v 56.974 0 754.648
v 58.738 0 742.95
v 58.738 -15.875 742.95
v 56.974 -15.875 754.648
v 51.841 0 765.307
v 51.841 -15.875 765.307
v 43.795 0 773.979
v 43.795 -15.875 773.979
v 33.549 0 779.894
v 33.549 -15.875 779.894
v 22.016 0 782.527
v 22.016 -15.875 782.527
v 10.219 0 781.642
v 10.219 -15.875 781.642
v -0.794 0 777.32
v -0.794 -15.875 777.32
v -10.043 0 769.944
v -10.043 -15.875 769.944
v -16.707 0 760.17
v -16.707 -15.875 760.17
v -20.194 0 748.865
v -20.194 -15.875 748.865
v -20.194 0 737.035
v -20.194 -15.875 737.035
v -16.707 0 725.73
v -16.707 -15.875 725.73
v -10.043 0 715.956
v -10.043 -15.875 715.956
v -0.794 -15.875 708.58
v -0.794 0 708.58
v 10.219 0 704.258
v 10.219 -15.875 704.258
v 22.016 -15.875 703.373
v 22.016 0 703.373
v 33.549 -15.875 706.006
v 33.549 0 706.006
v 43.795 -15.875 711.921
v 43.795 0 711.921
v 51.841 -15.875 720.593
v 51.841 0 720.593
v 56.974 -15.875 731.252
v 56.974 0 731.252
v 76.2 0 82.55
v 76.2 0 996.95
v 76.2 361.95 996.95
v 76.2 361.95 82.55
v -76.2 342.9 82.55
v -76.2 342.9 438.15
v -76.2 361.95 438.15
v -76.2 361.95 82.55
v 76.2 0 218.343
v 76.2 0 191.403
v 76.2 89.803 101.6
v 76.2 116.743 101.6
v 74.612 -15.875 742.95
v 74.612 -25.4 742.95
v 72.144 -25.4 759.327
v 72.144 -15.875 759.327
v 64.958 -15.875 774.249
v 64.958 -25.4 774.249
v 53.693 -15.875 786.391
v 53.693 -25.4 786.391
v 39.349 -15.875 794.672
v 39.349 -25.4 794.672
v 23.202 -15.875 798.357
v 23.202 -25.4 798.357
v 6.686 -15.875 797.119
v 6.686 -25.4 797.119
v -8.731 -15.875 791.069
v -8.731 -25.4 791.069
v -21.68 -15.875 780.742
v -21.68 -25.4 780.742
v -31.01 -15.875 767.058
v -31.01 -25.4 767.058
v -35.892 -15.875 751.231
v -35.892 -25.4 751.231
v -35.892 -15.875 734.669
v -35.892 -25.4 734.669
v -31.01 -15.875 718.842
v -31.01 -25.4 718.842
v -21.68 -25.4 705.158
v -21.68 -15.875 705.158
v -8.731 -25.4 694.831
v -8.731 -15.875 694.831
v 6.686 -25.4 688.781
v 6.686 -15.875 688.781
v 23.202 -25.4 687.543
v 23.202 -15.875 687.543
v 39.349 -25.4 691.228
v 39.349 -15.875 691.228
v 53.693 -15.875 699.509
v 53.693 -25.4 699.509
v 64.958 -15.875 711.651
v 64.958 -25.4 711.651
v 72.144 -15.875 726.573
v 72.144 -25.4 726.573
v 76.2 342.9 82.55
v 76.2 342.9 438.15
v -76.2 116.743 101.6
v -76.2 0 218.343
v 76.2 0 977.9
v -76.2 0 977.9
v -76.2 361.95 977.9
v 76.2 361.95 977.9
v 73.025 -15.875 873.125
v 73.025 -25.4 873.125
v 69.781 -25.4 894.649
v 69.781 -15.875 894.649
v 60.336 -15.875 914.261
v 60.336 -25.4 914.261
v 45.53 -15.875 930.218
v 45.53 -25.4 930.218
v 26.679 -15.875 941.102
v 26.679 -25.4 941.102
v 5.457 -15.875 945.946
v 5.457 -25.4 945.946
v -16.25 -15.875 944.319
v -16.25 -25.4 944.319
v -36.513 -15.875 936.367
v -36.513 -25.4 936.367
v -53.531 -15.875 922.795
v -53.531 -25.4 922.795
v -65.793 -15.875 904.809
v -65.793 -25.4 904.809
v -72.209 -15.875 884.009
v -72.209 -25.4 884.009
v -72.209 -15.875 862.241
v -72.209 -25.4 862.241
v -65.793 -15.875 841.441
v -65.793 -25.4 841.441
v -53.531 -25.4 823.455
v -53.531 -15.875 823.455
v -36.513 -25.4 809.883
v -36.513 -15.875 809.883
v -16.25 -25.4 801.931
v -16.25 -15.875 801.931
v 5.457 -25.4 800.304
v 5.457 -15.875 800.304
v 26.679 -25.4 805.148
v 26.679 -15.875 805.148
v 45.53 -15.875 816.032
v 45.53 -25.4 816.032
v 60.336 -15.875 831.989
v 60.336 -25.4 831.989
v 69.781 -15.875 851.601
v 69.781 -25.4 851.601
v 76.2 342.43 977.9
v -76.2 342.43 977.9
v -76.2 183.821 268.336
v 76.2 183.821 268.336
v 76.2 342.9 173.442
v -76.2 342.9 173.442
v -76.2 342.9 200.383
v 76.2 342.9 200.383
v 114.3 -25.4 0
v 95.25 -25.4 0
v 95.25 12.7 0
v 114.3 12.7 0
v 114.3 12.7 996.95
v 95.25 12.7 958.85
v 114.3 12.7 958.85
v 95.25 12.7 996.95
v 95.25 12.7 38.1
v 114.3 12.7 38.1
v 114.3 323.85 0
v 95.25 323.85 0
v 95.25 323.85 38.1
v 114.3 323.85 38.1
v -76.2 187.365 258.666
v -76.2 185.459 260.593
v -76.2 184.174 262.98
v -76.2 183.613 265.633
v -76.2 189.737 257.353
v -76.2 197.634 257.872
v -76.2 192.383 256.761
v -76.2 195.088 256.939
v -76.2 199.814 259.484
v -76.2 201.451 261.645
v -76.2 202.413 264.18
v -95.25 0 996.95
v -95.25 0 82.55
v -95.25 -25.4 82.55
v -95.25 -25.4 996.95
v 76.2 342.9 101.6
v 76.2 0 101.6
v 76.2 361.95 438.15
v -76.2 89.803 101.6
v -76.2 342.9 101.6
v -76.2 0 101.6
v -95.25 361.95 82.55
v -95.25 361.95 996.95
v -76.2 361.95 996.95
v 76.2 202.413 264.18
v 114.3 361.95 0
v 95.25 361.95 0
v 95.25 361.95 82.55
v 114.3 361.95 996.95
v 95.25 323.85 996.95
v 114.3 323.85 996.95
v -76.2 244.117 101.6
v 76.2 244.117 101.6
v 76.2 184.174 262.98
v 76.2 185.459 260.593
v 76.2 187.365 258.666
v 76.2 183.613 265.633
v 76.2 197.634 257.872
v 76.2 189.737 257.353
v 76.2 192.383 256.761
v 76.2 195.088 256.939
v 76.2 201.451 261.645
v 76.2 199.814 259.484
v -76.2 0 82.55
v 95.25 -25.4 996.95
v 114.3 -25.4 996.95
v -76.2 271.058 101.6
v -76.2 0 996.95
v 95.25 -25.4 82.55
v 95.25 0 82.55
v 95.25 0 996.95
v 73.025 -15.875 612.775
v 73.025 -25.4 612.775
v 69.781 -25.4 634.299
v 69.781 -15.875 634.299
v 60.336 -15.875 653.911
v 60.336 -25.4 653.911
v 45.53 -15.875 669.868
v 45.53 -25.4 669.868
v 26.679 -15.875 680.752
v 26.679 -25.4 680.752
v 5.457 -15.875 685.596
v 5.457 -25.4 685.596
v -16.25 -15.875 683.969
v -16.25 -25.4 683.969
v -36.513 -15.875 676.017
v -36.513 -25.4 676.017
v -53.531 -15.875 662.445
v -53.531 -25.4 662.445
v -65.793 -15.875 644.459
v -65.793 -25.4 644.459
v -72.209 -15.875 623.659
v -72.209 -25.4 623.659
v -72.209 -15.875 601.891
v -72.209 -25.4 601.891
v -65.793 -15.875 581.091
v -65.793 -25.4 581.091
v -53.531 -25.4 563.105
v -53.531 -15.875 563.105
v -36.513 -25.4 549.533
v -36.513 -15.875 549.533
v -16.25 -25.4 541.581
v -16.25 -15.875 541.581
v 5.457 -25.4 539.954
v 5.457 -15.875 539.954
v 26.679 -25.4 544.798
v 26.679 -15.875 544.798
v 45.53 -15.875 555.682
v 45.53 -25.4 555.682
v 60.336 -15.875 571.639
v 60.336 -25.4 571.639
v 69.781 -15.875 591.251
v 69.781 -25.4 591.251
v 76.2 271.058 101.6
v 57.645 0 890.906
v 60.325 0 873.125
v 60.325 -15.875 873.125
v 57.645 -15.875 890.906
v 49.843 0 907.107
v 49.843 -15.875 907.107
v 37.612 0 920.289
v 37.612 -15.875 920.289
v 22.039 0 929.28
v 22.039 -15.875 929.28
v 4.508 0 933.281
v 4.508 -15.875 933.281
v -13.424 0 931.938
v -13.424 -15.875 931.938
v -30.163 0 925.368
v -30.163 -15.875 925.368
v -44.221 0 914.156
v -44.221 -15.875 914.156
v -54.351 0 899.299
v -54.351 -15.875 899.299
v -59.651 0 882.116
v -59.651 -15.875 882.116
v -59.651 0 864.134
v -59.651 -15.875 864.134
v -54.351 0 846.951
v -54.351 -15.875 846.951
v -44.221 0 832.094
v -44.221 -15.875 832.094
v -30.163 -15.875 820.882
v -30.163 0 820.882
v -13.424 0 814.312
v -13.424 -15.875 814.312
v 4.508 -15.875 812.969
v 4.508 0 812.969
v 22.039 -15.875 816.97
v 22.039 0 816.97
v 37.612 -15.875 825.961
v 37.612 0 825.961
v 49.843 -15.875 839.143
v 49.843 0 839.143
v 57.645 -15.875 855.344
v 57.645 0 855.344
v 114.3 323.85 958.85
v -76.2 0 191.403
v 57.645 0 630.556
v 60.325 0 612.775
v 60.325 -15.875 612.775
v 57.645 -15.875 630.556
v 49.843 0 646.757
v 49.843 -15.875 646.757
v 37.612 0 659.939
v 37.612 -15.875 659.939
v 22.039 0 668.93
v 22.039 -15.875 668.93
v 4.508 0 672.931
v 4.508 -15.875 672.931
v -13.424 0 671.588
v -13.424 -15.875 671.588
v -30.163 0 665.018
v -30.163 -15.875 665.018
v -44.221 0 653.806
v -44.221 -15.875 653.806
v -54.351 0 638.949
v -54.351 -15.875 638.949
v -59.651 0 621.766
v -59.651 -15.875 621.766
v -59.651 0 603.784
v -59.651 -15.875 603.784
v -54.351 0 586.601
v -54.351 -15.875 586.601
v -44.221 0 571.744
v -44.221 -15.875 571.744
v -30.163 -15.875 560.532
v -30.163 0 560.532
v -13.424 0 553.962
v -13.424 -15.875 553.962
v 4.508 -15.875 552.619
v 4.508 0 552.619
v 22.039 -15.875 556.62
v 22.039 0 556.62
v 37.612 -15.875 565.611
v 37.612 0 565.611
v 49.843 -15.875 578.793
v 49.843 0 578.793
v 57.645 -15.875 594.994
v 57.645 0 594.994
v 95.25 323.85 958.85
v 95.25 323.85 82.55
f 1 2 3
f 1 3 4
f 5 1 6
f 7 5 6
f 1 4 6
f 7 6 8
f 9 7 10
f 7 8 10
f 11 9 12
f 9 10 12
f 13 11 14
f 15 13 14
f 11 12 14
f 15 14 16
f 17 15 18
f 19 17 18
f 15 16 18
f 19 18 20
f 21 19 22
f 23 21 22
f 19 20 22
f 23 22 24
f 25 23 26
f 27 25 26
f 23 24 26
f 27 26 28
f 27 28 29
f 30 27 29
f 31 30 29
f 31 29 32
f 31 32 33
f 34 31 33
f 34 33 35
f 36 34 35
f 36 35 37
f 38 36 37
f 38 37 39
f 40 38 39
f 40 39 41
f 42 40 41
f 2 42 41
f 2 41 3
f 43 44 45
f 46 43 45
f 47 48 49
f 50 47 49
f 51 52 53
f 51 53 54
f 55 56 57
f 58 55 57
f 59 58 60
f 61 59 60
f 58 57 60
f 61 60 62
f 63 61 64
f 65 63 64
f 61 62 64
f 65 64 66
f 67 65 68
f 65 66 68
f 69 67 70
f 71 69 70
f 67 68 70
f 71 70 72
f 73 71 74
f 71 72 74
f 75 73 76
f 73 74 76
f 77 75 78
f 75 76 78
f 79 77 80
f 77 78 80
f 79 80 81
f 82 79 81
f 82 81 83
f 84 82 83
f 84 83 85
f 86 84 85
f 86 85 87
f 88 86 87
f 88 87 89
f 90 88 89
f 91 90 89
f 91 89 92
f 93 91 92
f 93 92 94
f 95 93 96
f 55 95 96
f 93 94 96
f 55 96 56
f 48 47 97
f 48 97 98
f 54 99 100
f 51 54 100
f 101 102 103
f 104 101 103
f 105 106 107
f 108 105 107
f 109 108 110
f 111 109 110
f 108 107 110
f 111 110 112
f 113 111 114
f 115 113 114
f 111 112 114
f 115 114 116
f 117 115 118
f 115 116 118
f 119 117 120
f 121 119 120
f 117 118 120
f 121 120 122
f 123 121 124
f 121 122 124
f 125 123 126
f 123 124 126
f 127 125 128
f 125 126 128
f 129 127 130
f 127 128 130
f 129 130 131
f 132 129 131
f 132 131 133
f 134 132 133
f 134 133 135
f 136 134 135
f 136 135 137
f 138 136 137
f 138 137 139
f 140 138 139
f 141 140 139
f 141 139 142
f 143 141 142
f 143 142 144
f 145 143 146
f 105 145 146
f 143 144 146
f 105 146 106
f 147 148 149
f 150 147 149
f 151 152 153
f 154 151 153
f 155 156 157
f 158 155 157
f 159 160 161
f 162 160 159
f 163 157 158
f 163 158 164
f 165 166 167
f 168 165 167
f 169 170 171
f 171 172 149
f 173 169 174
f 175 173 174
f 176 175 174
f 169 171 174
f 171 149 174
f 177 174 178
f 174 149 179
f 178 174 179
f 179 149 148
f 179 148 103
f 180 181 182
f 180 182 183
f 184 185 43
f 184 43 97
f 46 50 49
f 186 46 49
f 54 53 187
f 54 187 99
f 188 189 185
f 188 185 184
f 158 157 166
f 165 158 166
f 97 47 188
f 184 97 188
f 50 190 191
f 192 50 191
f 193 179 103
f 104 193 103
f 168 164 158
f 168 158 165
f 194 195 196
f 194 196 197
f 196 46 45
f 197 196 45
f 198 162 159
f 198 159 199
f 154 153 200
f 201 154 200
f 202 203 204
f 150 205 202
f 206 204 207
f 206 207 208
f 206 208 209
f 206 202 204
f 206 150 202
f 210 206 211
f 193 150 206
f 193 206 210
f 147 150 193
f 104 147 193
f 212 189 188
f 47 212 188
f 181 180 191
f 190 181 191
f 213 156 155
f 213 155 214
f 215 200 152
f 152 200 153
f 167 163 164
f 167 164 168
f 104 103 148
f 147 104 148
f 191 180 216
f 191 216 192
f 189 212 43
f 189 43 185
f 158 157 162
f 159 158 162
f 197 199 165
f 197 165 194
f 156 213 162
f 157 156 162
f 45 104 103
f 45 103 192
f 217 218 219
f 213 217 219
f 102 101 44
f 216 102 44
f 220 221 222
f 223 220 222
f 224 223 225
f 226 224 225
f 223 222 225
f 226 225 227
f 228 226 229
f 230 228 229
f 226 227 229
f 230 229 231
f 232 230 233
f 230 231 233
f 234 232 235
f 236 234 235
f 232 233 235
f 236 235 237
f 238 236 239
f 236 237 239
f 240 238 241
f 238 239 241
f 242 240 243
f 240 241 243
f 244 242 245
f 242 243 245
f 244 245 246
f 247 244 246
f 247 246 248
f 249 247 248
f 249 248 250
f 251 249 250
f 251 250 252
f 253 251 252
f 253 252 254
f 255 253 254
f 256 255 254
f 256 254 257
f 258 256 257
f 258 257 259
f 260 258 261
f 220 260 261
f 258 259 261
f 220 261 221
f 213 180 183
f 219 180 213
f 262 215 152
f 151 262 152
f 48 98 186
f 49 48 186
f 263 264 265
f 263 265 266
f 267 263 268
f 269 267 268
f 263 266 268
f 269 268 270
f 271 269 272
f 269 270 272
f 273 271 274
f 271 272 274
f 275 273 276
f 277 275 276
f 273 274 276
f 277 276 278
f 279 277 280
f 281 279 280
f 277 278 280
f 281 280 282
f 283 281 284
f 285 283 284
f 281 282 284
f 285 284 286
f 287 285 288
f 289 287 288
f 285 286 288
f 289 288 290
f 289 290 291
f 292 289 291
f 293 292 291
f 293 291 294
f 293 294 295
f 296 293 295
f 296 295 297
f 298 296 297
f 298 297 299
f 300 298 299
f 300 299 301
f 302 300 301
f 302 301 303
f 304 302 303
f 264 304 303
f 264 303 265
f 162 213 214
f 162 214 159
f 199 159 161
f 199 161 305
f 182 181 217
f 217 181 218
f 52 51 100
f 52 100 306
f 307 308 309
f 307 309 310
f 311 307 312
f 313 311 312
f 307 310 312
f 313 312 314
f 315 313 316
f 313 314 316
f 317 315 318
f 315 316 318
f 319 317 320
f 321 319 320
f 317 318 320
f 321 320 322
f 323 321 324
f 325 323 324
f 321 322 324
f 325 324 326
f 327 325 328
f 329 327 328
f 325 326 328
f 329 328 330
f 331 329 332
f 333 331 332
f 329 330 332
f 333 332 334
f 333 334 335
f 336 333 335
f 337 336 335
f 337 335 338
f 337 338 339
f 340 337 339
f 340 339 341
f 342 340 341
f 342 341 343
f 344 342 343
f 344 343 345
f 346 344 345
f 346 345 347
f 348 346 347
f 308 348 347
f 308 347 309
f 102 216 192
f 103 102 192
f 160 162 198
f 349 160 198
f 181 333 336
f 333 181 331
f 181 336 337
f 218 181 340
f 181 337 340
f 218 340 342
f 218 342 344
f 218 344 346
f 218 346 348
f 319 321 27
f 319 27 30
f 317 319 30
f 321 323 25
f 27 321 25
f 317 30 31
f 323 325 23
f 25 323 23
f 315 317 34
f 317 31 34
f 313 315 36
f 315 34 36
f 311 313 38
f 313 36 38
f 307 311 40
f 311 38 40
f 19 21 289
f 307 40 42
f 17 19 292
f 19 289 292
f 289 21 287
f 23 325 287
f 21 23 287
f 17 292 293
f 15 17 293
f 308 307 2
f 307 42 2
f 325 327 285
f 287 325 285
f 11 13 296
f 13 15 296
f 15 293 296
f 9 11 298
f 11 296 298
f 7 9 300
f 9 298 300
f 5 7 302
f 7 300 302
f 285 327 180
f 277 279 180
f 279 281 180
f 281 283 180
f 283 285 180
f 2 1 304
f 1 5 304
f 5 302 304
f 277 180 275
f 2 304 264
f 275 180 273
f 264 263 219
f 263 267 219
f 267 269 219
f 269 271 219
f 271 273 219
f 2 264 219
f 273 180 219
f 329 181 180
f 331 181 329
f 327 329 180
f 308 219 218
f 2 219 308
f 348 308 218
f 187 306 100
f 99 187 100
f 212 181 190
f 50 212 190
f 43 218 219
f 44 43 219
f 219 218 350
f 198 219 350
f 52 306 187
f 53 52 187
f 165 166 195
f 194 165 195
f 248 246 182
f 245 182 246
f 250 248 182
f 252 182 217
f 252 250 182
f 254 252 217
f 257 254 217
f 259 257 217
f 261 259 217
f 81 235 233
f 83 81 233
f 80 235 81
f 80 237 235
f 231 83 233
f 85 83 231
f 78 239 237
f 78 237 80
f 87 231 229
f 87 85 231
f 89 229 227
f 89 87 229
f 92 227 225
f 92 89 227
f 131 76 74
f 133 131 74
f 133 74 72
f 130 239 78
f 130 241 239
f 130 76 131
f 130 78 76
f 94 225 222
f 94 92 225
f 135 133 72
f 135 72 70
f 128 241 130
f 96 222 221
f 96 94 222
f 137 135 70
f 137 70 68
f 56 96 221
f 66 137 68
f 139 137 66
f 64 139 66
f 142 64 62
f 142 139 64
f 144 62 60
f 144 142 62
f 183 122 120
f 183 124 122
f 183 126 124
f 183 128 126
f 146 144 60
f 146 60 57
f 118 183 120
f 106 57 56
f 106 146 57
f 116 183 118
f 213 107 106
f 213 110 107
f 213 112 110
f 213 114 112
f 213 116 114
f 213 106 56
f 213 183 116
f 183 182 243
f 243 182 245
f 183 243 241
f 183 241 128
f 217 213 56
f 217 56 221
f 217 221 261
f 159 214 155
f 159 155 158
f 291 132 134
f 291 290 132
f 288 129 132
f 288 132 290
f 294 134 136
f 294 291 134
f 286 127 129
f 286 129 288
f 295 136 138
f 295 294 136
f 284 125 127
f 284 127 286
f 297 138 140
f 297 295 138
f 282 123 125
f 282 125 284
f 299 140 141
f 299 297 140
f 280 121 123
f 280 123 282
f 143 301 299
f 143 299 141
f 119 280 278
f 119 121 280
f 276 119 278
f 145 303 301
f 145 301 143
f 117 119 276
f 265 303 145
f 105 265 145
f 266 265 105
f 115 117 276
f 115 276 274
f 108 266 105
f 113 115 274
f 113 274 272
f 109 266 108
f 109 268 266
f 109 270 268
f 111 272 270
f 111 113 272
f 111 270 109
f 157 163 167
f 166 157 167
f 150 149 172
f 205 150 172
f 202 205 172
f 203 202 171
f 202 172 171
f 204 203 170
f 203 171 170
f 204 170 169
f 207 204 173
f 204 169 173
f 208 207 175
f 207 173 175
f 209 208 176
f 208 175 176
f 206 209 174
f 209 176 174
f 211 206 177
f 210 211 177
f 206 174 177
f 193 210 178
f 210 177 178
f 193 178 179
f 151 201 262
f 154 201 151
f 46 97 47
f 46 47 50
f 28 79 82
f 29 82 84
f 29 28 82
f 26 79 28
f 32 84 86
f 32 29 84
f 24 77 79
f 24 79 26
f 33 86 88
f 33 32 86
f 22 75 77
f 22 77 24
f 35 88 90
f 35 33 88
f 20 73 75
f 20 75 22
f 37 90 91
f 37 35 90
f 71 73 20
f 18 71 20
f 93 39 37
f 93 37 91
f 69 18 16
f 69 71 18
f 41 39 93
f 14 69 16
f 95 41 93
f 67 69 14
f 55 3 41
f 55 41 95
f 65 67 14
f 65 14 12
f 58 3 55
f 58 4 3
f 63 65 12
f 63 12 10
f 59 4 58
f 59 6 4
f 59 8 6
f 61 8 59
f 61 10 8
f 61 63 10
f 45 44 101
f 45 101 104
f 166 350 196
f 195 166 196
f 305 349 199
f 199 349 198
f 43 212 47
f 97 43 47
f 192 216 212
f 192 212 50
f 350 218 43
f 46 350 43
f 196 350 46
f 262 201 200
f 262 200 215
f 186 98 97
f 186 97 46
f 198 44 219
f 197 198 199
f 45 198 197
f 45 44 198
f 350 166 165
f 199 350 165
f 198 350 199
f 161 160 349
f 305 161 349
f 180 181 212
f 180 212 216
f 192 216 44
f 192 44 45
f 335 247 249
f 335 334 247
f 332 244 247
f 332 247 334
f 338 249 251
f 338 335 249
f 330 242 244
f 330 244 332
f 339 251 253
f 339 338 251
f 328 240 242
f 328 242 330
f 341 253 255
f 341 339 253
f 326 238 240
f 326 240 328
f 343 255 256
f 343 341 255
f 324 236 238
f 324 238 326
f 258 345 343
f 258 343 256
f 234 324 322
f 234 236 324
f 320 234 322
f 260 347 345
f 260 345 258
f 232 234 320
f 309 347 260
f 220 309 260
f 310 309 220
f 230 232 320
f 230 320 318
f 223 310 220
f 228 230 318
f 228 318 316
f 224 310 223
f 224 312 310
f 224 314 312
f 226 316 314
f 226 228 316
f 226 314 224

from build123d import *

# Parameters (mm, degrees)
F2_W      = 190.5
F2_H      = 914.4
F3_DEPTH  = 25.4
F4_R      = 73.025
F4_R_2    = 55.5625
F5_DEPTH  = 9.525
F6_R      = 60.325
F6_R_2    = 39.6875
F7_DEPTH  = 15.876
F8_W      = 361.95
F8_H      = 914.4
F9_DEPTH  = 19.05
F11_W     = 19.05
F11_H     = 355.6
F12_DEPTH = 152.4
F13_W     = 361.95
F13_H     = 19.05
F14_DEPTH = 152.4
F16_DEPTH = 152.4
F17_W     = 342.9
F17_H     = 19.05
F18_DEPTH = 152.4
F20_DEPTH = 152.4
F22_DEPTH = 152.4
F23_W     = 38.1
F23_H     = 996.95
F24_DEPTH = 19.05
F25_W     = 38.1
F25_H     = 996.95
F26_DEPTH = 19.05
F27_W     = 311.15
F27_H     = 38.1
F28_DEPTH = 19.05
F29_W     = 311.15
F29_H     = 38.1
F30_DEPTH = 19.05


with BuildPart() as f3:
    # F2 (on Front) → F3 (new body)
    with BuildSketch(Plane.XZ):
        with Locations((0, 539.75)):
            Rectangle(F2_W, F2_H)
    extrude(amount=F3_DEPTH)

    # F4 (on face) → F5 (cut)
    with BuildSketch(Plane.XZ.offset(25.4)):
        with Locations((0, 873.125)):
            Circle(F4_R)
        with Locations((19.05, 742.95)):
            Circle(F4_R_2)
        with Locations((0, 612.775)):
            Circle(F4_R)
    extrude(amount=-F5_DEPTH, mode=Mode.SUBTRACT)

    # F6 (on face) → F7 (cut, through all)
    with BuildSketch(Plane.XZ.offset(15.875)):
        with Locations((0, 873.125)):
            Circle(F6_R)
        with Locations((19.05, 742.95)):
            Circle(F6_R_2)
        with Locations((0, 612.775)):
            Circle(F6_R)
    extrude(amount=-F7_DEPTH, mode=Mode.SUBTRACT)


with BuildPart() as f9:
    # F8 (on face) → F9 (new body)
    with BuildSketch(Plane.YZ.offset(95.25)):
        with Locations((180.975, 539.75)):
            Rectangle(F8_W, F8_H)
    extrude(amount=-F9_DEPTH)


with BuildPart() as f10_1:
    # F10: instance of F9
    add(f9.part.mirror(Plane.YZ))


with BuildPart() as f12:
    # F11 (on face) → F12 (new body)
    with BuildSketch(Plane.YZ.offset(-76.2)):
        with Locations((352.425, 260.35)):
            Rectangle(F11_W, F11_H)
    extrude(amount=F12_DEPTH)


with BuildPart() as f14:
    # F13 (on face) → F14 (new body)
    with BuildSketch(Plane.YZ.offset(-76.2)):
        with Locations((180.975, 987.425)):
            Rectangle(F13_W, F13_H)
    extrude(amount=F14_DEPTH)


with BuildPart() as f16:
    # F15 (on face) → F16 (new body)
    with BuildSketch(Plane.YZ.offset(-76.2)):
        with BuildLine():
            Line((202.4126065958, 264.180082139), (361.95, 977.9))
            Line((361.95, 977.9), (342.4298804353, 977.9))
            Line((342.4298804353, 977.9), (183.821403873, 268.3357627476))
            ThreePointArc((183.821403873, 268.3357627476), (191.0391649301, 256.9623210819), (202.4126065958, 264.180082139))
        make_face()
    extrude(amount=F16_DEPTH)


with BuildPart() as f18:
    # F17 (on face) → F18 (new body)
    with BuildSketch(Plane.YZ.offset(-76.2)):
        with Locations((171.45, 92.075)):
            Rectangle(F17_W, F17_H)
    extrude(amount=F18_DEPTH)


with BuildPart() as f20:
    # F19 (on face) → F20 (new body)
    with BuildSketch(Plane.YZ.offset(-76.2)):
        Polygon((342.9, 200.3828173318), (244.1171826682, 101.6), (271.0579510314, 101.6), (342.9, 173.4420489686), align=None)
    extrude(amount=F20_DEPTH)


with BuildPart() as f22:
    # F21 (on face) → F22 (new body)
    with BuildSketch(Plane.YZ.offset(-76.2)):
        Polygon((116.7433295739, 101.6), (0, 218.3433295739), (0, 191.4025612107), (89.8025612107, 101.6), align=None)
    extrude(amount=F22_DEPTH)


with BuildPart() as f24:
    # F23 (on face) → F24 (new body)
    with BuildSketch(Plane.YZ.offset(95.25)):
        with Locations((-6.35, 498.475)):
            Rectangle(F23_W, F23_H)
    extrude(amount=F24_DEPTH)


with BuildPart() as f9_1:
    add(f9.part)

    # F25 (on face) → F26 (join)
    with BuildSketch(Plane.YZ.offset(95.25)):
        with Locations((342.9, 498.475)):
            Rectangle(F25_W, F25_H)
    extrude(amount=F26_DEPTH)


with BuildPart() as f28:
    # F27 (on face) → F28 (new body)
    with BuildSketch(Plane.YZ.offset(95.25)):
        with Locations((168.275, 977.9)):
            Rectangle(F27_W, F27_H)
    extrude(amount=F28_DEPTH)


with BuildPart() as f30:
    # F29 (on face) → F30 (new body)
    with BuildSketch(Plane.YZ.offset(95.25)):
        with Locations((168.275, 19.05)):
            Rectangle(F29_W, F29_H)
    extrude(amount=F30_DEPTH)


solid = Compound([f3.part, f10_1.part, f12.part, f14.part, f16.part, f18.part, f20.part, f22.part, f24.part, f9_1.part, f28.part, f30.part])
